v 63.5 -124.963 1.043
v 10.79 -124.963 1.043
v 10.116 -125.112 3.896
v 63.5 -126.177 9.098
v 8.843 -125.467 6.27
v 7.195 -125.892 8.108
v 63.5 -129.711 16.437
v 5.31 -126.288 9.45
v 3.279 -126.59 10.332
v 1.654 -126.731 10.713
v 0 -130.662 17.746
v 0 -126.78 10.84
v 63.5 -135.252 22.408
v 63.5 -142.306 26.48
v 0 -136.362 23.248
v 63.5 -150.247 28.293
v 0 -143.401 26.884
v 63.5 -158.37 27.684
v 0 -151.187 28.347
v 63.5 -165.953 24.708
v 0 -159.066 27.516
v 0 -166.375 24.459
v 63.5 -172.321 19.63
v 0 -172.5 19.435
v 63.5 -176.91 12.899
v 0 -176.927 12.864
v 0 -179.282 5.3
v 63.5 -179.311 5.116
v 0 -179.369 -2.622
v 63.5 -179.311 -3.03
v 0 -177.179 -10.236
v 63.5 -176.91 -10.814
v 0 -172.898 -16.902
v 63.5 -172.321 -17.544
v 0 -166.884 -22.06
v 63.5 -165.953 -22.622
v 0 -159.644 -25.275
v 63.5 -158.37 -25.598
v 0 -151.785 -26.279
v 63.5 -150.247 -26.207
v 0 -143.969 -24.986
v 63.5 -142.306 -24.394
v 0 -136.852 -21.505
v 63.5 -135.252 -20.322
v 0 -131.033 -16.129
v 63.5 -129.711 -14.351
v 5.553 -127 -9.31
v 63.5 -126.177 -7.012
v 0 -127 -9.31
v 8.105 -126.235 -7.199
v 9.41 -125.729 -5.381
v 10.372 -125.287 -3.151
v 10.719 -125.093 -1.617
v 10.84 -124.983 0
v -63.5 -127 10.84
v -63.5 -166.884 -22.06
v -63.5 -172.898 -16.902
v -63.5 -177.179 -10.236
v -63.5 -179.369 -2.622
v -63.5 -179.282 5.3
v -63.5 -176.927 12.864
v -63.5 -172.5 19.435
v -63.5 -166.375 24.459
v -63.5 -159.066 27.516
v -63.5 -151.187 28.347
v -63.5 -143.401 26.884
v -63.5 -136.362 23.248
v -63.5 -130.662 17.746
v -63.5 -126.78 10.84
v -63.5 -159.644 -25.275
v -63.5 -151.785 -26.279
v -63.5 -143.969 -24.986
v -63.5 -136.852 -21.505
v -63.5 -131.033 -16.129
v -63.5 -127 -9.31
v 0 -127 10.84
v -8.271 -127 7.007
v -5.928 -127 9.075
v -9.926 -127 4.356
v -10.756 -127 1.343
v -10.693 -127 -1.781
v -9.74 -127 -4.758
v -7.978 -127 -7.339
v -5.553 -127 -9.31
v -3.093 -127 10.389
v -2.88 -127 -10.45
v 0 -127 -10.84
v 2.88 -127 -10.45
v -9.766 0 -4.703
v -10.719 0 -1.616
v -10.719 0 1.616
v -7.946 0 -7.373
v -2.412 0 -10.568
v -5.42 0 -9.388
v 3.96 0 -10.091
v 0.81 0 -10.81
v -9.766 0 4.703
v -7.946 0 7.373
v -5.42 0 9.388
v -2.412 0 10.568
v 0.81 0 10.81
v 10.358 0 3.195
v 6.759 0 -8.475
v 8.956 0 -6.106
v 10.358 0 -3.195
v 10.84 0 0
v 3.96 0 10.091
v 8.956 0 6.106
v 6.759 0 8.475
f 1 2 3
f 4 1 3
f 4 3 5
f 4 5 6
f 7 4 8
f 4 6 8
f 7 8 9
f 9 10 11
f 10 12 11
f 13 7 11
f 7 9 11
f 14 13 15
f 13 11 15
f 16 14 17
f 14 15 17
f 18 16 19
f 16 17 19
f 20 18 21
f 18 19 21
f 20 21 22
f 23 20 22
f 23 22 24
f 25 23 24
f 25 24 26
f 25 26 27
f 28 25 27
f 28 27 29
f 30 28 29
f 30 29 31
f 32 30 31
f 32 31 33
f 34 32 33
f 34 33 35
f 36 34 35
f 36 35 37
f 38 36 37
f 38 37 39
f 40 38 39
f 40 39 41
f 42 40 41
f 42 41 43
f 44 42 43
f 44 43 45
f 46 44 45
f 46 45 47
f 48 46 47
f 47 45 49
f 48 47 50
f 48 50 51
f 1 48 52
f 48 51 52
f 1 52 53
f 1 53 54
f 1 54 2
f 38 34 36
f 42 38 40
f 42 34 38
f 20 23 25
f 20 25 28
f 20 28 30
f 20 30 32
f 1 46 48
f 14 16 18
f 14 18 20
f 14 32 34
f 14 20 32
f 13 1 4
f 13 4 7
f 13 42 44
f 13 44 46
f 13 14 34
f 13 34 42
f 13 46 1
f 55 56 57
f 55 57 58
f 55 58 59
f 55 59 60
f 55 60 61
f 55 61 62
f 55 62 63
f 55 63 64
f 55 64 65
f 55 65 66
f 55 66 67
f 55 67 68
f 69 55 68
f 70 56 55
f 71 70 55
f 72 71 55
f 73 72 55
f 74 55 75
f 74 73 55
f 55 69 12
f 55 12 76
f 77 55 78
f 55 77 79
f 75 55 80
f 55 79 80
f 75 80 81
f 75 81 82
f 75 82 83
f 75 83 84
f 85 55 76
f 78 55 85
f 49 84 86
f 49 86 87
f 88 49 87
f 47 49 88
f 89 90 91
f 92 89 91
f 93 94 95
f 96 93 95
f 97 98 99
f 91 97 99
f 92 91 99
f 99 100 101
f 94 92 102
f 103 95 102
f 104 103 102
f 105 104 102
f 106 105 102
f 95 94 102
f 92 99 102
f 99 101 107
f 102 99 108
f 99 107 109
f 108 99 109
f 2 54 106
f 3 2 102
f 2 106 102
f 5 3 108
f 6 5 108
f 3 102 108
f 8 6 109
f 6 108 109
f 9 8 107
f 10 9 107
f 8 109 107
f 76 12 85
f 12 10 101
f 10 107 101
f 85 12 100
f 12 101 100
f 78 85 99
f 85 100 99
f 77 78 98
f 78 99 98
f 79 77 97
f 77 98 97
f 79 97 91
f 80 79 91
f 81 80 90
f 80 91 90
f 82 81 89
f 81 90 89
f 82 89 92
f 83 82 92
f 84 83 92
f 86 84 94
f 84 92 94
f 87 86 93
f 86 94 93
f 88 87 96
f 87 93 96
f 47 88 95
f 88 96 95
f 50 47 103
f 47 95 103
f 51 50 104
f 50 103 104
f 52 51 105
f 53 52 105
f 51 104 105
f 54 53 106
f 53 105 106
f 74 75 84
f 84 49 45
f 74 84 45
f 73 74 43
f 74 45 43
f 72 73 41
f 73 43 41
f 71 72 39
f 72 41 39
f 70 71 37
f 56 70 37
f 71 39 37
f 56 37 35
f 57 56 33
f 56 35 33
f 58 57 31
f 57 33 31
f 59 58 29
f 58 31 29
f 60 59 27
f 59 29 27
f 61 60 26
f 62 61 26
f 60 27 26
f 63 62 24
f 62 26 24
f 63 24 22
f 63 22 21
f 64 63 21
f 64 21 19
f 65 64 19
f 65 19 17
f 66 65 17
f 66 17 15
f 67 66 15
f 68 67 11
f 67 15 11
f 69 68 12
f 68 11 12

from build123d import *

# Parameters (mm, degrees)
F0_R      = 10.839936
F1_DEPTH  = 50.8
F1_FACE_R = 10.839936
F2_DEPTH  = 76.2
F3_R      = 27.326427
F4_DEPTH  = 63.5
F5_DEPTH  = 63.5


with BuildPart() as f1:
    # F0 (on Front) → F1 (new body)
    with BuildSketch(Plane.XZ):
        Circle(F0_R)
    extrude(amount=F1_DEPTH)

    # F1_face (on face) → F2 (join)
    with BuildSketch(Plane.XZ.offset(50.8)):
        Circle(F1_FACE_R)
    extrude(amount=F2_DEPTH)

    # F3 (on Right) → F4 (join)
    with BuildSketch(Plane.YZ):
        with Locations((-152.289372, 1.042985)):
            Circle(F3_R)
    extrude(amount=F4_DEPTH)

    # F4_face (on face) → F5 (join)
    with BuildSketch(Plane(origin=(0, -152.607876, 1.043252), x_dir=(0, 1, 0), z_dir=(-1, 0, 0))):
        with BuildLine():
            Line((25.828372, -9.796684), (25.607876, -9.796684))
            Line((25.607876, -9.796684), (25.607876, 10.353106))
            ThreePointArc((25.607876, 10.353106), (-27.006288, -0.298744), (25.828372, -9.796684))
        make_face()
    extrude(amount=F5_DEPTH)


solid = f1.part
